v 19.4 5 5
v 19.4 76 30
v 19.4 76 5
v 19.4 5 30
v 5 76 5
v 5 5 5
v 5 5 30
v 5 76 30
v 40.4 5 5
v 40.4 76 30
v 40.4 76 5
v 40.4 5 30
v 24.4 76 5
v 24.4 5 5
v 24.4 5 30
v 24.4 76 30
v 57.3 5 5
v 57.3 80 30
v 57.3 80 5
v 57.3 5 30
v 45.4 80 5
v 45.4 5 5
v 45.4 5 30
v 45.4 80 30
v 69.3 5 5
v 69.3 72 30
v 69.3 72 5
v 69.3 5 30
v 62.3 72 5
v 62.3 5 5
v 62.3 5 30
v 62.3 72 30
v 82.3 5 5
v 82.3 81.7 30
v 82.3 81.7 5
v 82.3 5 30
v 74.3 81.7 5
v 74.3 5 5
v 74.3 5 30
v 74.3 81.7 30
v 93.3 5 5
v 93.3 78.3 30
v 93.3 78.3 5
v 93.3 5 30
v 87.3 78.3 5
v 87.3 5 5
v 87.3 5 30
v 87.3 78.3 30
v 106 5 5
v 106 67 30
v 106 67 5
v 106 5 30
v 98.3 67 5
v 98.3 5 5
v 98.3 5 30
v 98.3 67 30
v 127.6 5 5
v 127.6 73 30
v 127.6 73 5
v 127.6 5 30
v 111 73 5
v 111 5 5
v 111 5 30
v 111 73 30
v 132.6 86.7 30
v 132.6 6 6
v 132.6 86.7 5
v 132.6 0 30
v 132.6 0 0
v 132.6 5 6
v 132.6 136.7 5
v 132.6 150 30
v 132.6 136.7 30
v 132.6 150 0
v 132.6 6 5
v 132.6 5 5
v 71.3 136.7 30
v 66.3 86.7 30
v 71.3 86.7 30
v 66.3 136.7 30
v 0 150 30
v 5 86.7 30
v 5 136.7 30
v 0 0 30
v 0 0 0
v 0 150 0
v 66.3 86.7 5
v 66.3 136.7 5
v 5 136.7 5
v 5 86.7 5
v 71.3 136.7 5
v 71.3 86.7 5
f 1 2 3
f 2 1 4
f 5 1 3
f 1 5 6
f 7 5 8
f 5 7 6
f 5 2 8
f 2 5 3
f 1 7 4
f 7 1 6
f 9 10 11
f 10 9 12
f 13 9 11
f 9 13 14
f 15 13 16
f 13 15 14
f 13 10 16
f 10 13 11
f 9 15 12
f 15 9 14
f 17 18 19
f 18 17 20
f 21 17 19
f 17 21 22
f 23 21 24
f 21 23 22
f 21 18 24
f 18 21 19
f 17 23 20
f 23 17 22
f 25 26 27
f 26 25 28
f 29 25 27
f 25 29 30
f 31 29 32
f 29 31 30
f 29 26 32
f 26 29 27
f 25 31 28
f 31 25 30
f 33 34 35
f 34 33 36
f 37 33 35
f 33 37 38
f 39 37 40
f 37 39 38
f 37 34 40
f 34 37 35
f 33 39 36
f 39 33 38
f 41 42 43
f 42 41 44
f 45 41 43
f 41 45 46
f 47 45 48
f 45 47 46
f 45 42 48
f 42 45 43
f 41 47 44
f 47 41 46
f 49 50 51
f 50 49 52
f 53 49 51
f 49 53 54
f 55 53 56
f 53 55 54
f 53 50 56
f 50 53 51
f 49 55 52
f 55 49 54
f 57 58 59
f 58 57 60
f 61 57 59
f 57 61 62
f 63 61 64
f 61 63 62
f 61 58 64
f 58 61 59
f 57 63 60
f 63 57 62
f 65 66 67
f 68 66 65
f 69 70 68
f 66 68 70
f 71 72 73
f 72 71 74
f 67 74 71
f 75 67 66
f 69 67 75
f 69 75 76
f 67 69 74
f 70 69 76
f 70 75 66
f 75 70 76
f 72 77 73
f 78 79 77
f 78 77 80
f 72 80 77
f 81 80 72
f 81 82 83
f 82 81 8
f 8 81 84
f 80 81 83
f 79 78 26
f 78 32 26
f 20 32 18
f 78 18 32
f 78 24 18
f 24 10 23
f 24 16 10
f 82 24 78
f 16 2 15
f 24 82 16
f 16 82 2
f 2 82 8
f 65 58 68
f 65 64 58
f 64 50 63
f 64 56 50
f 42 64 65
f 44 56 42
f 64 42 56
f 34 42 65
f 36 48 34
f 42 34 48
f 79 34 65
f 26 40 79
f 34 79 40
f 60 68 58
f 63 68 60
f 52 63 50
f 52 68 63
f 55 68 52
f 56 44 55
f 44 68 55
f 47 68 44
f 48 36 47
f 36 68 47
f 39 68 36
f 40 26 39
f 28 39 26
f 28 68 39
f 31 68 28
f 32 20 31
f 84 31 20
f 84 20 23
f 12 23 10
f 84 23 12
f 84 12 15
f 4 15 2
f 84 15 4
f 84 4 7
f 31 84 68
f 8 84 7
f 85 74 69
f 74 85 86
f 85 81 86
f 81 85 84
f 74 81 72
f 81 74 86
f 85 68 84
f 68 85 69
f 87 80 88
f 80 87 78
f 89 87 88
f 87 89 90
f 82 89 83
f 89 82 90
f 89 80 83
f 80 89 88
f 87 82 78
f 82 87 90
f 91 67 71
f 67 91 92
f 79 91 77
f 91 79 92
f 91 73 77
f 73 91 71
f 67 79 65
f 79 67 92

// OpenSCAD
clear = 0.2;
edge = 5;
slotlist = 
[
    [14.4,71],      // MI battery
    [16,  71],      // QC3 battery
    [11.9,75],      // Fairphone
    [7,   67],      // iPhone 6
    [8,   76.7],    // Pixel 2 XL
    [6,   73.3],    // mama wallet
    [7.7, 62],      // mama card
    [16.6,68],      // my wallet
];


module slot_cutout(){ 
    for (i = [0:len(slotlist)]) {
        slot = slotlist[i];
        translate([sumto([for(s = slotlist)s.x],i-1)+i*5,0,0]) cube([slot.x, slot.y, 100]);
    }
}

sum_x = sumto([for(s = slotlist)s.x],len(slotlist)-1);
keywell_width = (sum_x+edge*(len(slotlist)-1))/2;


difference(){
    cube([sum_x+edge*(len(slotlist)+1),150,30]);
    translate([edge,edge,edge]) slot_cutout();
    translate([edge,max([for(s = slotlist)s.y])+edge*2,edge])      cube([(sum_x+edge*(len(slotlist)-1))/2,50,100]);
    translate([edge*2+(sum_x+edge*(len(slotlist)-1))/2,max([for(s = slotlist)s.y])+edge*2,edge]) cube([(sum_x+edge*(len(slotlist)-1))/2,50,100]);
    
}

function sumto(v, i) = (i < 0 ? 0 : sumto(v, i-1) + v[i]);
echo(sumto([for(s = slotlist)s.x],2));
